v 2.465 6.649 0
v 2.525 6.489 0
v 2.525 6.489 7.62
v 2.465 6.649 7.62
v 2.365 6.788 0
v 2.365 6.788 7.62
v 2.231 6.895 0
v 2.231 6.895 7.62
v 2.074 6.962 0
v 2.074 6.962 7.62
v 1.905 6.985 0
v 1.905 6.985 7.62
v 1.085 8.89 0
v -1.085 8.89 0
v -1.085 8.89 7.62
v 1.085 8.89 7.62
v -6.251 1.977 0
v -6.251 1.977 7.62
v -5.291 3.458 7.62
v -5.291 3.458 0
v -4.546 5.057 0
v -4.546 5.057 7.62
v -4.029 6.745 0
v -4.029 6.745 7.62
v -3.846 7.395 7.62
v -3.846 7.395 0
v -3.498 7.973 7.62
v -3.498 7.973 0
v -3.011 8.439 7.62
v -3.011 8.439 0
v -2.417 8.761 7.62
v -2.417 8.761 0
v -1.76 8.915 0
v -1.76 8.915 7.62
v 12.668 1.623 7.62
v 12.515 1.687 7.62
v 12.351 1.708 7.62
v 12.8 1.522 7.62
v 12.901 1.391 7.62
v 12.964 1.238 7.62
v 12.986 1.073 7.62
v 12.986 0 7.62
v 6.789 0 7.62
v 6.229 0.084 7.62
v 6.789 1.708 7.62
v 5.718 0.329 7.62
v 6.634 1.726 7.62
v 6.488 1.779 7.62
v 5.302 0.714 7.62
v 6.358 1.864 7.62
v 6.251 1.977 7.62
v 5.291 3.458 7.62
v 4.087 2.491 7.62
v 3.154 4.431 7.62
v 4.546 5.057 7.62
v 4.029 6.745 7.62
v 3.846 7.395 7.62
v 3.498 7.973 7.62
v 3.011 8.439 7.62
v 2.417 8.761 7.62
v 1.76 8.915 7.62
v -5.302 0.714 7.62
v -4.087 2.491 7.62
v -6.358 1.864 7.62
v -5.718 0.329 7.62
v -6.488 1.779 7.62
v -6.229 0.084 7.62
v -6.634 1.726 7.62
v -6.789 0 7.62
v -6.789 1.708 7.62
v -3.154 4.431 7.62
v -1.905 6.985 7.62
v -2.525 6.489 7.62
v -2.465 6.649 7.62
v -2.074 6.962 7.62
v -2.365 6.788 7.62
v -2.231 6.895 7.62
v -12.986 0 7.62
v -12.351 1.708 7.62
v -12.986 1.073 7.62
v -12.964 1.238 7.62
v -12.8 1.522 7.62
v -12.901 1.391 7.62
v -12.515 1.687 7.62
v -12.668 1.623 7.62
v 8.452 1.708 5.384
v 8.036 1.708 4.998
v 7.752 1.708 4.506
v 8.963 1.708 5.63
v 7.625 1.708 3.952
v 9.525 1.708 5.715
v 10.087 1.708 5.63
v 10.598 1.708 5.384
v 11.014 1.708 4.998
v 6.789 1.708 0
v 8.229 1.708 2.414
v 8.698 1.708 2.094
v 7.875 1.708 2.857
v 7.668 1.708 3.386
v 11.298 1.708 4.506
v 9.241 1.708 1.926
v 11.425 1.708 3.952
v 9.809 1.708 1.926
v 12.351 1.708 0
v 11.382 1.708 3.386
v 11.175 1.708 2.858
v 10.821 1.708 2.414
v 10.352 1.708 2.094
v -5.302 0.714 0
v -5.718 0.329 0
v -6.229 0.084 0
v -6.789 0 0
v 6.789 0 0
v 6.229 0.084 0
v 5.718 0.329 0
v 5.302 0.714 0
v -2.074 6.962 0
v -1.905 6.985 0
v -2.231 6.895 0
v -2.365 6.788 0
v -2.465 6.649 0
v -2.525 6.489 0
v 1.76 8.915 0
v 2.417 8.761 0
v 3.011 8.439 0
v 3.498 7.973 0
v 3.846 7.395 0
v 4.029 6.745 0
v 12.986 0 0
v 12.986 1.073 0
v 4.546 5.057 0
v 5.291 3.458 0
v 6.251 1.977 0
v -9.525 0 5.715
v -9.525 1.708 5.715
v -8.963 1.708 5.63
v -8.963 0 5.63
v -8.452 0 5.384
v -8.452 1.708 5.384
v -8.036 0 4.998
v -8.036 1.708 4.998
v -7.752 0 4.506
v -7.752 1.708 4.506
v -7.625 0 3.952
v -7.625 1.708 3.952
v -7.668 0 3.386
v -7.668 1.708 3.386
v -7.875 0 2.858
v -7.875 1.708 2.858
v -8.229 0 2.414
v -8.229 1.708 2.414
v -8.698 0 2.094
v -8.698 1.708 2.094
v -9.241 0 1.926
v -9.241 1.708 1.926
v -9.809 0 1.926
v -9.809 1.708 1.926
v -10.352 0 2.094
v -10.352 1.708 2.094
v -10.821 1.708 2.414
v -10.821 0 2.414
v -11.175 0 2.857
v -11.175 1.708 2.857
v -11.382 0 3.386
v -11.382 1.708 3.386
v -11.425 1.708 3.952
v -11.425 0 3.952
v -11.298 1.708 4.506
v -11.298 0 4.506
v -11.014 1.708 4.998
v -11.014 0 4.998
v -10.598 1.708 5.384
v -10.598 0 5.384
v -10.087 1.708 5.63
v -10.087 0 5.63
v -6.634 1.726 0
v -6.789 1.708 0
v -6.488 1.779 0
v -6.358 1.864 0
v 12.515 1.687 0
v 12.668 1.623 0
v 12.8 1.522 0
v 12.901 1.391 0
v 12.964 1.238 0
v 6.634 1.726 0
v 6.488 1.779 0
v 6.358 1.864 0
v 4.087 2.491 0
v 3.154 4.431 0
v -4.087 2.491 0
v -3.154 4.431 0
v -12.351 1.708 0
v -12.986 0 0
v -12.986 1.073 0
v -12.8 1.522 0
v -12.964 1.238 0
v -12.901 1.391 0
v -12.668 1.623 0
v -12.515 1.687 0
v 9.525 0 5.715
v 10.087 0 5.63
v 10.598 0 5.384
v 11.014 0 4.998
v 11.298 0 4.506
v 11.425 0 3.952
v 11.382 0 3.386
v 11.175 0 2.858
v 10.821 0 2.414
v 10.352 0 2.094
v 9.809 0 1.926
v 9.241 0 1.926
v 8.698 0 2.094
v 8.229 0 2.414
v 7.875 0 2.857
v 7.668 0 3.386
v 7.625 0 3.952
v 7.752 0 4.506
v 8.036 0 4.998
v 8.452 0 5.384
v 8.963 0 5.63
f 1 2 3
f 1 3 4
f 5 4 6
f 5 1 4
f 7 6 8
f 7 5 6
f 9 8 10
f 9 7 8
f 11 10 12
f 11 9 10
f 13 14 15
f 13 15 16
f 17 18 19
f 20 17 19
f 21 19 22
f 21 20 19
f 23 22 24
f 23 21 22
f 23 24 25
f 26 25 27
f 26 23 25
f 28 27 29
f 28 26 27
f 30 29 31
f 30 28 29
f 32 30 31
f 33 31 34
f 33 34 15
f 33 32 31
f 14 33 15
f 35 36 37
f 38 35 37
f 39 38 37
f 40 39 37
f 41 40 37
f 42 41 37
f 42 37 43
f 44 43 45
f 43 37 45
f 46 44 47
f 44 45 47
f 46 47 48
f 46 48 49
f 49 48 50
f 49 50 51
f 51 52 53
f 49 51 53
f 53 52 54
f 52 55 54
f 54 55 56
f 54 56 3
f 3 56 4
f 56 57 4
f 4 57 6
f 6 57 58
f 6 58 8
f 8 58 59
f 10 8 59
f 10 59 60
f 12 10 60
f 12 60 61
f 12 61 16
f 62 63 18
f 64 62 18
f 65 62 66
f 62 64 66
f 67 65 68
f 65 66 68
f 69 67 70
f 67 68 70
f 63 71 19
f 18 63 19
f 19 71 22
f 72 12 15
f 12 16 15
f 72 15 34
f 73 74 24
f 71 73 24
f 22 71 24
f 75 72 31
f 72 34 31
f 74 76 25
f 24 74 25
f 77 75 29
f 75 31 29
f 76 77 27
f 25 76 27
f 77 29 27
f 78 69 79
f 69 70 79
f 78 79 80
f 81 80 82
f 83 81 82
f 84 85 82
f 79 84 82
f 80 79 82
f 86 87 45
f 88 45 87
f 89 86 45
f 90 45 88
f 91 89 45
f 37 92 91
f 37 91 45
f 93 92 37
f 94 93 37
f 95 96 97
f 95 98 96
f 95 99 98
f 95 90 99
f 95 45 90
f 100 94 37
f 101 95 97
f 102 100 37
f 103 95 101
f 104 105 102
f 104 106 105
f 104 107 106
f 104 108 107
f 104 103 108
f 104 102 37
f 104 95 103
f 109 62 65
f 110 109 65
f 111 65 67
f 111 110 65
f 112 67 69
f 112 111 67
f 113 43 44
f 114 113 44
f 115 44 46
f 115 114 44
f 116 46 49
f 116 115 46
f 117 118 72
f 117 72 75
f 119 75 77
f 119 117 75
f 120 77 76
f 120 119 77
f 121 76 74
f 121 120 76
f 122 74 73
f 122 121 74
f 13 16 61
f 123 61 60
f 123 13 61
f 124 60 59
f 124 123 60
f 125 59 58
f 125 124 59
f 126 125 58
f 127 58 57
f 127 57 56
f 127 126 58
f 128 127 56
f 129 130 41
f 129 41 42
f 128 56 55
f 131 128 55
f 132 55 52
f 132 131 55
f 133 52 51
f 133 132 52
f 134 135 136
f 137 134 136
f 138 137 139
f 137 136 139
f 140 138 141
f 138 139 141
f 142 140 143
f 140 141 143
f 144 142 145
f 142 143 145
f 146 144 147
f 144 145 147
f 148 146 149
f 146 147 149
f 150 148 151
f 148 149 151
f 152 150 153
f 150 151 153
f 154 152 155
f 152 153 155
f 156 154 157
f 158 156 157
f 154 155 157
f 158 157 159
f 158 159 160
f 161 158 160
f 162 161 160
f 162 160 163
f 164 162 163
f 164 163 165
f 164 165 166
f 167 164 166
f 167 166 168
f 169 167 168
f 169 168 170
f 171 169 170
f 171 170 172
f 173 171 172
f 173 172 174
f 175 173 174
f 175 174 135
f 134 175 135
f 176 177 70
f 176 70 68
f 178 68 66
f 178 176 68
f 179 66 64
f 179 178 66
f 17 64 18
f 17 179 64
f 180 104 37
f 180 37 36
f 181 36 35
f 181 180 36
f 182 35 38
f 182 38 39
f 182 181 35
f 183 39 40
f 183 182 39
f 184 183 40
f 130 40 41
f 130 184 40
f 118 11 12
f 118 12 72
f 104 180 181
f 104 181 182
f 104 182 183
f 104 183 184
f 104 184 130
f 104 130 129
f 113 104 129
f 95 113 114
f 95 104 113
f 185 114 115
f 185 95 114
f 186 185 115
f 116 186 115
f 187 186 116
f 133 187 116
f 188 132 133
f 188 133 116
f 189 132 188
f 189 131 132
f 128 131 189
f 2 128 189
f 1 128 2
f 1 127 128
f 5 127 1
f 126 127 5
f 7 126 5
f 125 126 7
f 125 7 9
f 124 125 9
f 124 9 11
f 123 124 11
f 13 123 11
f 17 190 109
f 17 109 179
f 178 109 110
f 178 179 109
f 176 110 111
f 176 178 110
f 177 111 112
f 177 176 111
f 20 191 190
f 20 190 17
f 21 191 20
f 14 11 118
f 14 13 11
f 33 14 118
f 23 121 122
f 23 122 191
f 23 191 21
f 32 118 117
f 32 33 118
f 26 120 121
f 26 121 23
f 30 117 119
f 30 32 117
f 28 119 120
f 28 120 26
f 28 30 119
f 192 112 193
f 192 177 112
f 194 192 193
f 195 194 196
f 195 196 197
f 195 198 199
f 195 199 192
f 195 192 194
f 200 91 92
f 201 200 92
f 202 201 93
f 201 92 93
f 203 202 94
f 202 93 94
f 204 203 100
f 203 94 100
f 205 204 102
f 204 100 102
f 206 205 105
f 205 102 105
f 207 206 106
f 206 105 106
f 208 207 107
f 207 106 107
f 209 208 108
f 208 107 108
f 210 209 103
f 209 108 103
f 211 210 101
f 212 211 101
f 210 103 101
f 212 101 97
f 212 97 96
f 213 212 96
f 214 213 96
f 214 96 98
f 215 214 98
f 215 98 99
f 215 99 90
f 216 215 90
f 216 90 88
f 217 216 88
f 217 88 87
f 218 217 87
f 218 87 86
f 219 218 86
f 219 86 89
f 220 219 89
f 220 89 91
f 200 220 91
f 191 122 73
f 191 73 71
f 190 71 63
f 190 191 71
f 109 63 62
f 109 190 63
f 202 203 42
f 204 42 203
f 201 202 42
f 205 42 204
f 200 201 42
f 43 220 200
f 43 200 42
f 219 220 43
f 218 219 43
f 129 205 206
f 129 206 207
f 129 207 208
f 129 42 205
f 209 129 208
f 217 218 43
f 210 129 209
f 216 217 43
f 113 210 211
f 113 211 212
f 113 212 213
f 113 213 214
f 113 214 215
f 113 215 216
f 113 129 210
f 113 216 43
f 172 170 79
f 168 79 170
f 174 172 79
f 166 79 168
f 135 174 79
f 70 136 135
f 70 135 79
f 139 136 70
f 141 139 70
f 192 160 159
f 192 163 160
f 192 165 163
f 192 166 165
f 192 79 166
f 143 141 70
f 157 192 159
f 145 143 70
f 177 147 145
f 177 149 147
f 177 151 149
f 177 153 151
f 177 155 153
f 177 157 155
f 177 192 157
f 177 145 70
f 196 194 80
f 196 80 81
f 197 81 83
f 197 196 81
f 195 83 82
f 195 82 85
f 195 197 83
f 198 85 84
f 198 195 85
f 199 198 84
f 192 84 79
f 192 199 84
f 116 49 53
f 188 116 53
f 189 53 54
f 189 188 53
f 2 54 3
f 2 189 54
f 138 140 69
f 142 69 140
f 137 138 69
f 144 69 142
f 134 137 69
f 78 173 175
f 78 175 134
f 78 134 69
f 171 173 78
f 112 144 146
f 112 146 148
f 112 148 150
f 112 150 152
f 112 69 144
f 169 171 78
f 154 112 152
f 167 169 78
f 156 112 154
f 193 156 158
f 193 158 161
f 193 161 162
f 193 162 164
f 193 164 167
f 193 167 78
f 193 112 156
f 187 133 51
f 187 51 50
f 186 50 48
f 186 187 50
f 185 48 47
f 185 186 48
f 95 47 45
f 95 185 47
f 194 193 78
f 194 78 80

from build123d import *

# Parameters (mm, degrees)
BOSS_EXTRUDE1_DEPTH = 7.62
SKETCH2_R           = 1.905
CUT_EXTRUDE1_DEPTH  = 5.08


with BuildPart() as part:
    # Sketch1 → Boss-Extrude1 (new body)
    with BuildSketch(Plane.XY):
        with BuildLine():
            Line((1.905, 6.985), (-1.905, 6.985))
            ThreePointArc((-1.905, 6.985), (-2.301749521, 6.845797154), (-2.524550498, 6.489219898))
            ThreePointArc((-2.524550498, 6.489219898), (-3.583781011, 3.443081012), (-5.301992306, 0.713853771))
            ThreePointArc((-5.301992306, 0.713853771), (-5.964076777, 0.187711648), (-6.788664987, 0))
            Line((-6.788664987, 0), (-12.985936717, 0))
            Line((-12.985936717, 0), (-12.985936717, 1.073162668))
            ThreePointArc((-12.985936717, 1.073162668), (-12.799949523, 1.522175474), (-12.350936717, 1.708162668))
            Line((-12.350936717, 1.708162668), (-6.788664987, 1.708162668))
            ThreePointArc((-6.788664987, 1.708162668), (-6.488026831, 1.77904797), (-6.250721894, 1.976770993))
            ThreePointArc((-6.250721894, 1.976770993), (-4.890441533, 4.244637177), (-4.029326465, 6.745049248))
            ThreePointArc((-4.029326465, 6.745049248), (-3.010501923, 8.43943232), (-1.085423689, 8.89))
            Line((-1.085423689, 8.89), (1.085423689, 8.89))
            ThreePointArc((1.085423689, 8.89), (3.010501923, 8.43943232), (4.029326465, 6.745049248))
            ThreePointArc((4.029326465, 6.745049248), (4.890441533, 4.244637177), (6.250721894, 1.976770993))
            ThreePointArc((6.250721894, 1.976770993), (6.488026831, 1.77904797), (6.788664987, 1.708162668))
            Line((6.788664987, 1.708162668), (12.350936717, 1.708162668))
            ThreePointArc((12.350936717, 1.708162668), (12.799949523, 1.522175474), (12.985936717, 1.073162668))
            Line((12.985936717, 1.073162668), (12.985936717, 0))
            Line((12.985936717, 0), (6.788664987, 0))
            ThreePointArc((6.788664987, 0), (5.964076777, 0.187711648), (5.301992306, 0.713853771))
            ThreePointArc((5.301992306, 0.713853771), (3.583781011, 3.443081012), (2.524550498, 6.489219898))
            ThreePointArc((2.524550498, 6.489219898), (2.301749521, 6.845797154), (1.905, 6.985))
        make_face()
    extrude(amount=BOSS_EXTRUDE1_DEPTH)

    # Sketch2 → Cut-Extrude1 (cut)
    with BuildSketch(Plane(origin=(0, 1.708162668, 0), x_dir=(1, 0, 0), z_dir=(0, 1, 0))):
        with Locations(Location((9.525, -3.81, 0), (0, 0, 270))):
            Circle(SKETCH2_R)
        with Locations(Location((-9.525, -3.81, 0), (0, 0, 270))):
            Circle(SKETCH2_R)
    extrude(amount=-CUT_EXTRUDE1_DEPTH, mode=Mode.SUBTRACT)


solid = part.part
